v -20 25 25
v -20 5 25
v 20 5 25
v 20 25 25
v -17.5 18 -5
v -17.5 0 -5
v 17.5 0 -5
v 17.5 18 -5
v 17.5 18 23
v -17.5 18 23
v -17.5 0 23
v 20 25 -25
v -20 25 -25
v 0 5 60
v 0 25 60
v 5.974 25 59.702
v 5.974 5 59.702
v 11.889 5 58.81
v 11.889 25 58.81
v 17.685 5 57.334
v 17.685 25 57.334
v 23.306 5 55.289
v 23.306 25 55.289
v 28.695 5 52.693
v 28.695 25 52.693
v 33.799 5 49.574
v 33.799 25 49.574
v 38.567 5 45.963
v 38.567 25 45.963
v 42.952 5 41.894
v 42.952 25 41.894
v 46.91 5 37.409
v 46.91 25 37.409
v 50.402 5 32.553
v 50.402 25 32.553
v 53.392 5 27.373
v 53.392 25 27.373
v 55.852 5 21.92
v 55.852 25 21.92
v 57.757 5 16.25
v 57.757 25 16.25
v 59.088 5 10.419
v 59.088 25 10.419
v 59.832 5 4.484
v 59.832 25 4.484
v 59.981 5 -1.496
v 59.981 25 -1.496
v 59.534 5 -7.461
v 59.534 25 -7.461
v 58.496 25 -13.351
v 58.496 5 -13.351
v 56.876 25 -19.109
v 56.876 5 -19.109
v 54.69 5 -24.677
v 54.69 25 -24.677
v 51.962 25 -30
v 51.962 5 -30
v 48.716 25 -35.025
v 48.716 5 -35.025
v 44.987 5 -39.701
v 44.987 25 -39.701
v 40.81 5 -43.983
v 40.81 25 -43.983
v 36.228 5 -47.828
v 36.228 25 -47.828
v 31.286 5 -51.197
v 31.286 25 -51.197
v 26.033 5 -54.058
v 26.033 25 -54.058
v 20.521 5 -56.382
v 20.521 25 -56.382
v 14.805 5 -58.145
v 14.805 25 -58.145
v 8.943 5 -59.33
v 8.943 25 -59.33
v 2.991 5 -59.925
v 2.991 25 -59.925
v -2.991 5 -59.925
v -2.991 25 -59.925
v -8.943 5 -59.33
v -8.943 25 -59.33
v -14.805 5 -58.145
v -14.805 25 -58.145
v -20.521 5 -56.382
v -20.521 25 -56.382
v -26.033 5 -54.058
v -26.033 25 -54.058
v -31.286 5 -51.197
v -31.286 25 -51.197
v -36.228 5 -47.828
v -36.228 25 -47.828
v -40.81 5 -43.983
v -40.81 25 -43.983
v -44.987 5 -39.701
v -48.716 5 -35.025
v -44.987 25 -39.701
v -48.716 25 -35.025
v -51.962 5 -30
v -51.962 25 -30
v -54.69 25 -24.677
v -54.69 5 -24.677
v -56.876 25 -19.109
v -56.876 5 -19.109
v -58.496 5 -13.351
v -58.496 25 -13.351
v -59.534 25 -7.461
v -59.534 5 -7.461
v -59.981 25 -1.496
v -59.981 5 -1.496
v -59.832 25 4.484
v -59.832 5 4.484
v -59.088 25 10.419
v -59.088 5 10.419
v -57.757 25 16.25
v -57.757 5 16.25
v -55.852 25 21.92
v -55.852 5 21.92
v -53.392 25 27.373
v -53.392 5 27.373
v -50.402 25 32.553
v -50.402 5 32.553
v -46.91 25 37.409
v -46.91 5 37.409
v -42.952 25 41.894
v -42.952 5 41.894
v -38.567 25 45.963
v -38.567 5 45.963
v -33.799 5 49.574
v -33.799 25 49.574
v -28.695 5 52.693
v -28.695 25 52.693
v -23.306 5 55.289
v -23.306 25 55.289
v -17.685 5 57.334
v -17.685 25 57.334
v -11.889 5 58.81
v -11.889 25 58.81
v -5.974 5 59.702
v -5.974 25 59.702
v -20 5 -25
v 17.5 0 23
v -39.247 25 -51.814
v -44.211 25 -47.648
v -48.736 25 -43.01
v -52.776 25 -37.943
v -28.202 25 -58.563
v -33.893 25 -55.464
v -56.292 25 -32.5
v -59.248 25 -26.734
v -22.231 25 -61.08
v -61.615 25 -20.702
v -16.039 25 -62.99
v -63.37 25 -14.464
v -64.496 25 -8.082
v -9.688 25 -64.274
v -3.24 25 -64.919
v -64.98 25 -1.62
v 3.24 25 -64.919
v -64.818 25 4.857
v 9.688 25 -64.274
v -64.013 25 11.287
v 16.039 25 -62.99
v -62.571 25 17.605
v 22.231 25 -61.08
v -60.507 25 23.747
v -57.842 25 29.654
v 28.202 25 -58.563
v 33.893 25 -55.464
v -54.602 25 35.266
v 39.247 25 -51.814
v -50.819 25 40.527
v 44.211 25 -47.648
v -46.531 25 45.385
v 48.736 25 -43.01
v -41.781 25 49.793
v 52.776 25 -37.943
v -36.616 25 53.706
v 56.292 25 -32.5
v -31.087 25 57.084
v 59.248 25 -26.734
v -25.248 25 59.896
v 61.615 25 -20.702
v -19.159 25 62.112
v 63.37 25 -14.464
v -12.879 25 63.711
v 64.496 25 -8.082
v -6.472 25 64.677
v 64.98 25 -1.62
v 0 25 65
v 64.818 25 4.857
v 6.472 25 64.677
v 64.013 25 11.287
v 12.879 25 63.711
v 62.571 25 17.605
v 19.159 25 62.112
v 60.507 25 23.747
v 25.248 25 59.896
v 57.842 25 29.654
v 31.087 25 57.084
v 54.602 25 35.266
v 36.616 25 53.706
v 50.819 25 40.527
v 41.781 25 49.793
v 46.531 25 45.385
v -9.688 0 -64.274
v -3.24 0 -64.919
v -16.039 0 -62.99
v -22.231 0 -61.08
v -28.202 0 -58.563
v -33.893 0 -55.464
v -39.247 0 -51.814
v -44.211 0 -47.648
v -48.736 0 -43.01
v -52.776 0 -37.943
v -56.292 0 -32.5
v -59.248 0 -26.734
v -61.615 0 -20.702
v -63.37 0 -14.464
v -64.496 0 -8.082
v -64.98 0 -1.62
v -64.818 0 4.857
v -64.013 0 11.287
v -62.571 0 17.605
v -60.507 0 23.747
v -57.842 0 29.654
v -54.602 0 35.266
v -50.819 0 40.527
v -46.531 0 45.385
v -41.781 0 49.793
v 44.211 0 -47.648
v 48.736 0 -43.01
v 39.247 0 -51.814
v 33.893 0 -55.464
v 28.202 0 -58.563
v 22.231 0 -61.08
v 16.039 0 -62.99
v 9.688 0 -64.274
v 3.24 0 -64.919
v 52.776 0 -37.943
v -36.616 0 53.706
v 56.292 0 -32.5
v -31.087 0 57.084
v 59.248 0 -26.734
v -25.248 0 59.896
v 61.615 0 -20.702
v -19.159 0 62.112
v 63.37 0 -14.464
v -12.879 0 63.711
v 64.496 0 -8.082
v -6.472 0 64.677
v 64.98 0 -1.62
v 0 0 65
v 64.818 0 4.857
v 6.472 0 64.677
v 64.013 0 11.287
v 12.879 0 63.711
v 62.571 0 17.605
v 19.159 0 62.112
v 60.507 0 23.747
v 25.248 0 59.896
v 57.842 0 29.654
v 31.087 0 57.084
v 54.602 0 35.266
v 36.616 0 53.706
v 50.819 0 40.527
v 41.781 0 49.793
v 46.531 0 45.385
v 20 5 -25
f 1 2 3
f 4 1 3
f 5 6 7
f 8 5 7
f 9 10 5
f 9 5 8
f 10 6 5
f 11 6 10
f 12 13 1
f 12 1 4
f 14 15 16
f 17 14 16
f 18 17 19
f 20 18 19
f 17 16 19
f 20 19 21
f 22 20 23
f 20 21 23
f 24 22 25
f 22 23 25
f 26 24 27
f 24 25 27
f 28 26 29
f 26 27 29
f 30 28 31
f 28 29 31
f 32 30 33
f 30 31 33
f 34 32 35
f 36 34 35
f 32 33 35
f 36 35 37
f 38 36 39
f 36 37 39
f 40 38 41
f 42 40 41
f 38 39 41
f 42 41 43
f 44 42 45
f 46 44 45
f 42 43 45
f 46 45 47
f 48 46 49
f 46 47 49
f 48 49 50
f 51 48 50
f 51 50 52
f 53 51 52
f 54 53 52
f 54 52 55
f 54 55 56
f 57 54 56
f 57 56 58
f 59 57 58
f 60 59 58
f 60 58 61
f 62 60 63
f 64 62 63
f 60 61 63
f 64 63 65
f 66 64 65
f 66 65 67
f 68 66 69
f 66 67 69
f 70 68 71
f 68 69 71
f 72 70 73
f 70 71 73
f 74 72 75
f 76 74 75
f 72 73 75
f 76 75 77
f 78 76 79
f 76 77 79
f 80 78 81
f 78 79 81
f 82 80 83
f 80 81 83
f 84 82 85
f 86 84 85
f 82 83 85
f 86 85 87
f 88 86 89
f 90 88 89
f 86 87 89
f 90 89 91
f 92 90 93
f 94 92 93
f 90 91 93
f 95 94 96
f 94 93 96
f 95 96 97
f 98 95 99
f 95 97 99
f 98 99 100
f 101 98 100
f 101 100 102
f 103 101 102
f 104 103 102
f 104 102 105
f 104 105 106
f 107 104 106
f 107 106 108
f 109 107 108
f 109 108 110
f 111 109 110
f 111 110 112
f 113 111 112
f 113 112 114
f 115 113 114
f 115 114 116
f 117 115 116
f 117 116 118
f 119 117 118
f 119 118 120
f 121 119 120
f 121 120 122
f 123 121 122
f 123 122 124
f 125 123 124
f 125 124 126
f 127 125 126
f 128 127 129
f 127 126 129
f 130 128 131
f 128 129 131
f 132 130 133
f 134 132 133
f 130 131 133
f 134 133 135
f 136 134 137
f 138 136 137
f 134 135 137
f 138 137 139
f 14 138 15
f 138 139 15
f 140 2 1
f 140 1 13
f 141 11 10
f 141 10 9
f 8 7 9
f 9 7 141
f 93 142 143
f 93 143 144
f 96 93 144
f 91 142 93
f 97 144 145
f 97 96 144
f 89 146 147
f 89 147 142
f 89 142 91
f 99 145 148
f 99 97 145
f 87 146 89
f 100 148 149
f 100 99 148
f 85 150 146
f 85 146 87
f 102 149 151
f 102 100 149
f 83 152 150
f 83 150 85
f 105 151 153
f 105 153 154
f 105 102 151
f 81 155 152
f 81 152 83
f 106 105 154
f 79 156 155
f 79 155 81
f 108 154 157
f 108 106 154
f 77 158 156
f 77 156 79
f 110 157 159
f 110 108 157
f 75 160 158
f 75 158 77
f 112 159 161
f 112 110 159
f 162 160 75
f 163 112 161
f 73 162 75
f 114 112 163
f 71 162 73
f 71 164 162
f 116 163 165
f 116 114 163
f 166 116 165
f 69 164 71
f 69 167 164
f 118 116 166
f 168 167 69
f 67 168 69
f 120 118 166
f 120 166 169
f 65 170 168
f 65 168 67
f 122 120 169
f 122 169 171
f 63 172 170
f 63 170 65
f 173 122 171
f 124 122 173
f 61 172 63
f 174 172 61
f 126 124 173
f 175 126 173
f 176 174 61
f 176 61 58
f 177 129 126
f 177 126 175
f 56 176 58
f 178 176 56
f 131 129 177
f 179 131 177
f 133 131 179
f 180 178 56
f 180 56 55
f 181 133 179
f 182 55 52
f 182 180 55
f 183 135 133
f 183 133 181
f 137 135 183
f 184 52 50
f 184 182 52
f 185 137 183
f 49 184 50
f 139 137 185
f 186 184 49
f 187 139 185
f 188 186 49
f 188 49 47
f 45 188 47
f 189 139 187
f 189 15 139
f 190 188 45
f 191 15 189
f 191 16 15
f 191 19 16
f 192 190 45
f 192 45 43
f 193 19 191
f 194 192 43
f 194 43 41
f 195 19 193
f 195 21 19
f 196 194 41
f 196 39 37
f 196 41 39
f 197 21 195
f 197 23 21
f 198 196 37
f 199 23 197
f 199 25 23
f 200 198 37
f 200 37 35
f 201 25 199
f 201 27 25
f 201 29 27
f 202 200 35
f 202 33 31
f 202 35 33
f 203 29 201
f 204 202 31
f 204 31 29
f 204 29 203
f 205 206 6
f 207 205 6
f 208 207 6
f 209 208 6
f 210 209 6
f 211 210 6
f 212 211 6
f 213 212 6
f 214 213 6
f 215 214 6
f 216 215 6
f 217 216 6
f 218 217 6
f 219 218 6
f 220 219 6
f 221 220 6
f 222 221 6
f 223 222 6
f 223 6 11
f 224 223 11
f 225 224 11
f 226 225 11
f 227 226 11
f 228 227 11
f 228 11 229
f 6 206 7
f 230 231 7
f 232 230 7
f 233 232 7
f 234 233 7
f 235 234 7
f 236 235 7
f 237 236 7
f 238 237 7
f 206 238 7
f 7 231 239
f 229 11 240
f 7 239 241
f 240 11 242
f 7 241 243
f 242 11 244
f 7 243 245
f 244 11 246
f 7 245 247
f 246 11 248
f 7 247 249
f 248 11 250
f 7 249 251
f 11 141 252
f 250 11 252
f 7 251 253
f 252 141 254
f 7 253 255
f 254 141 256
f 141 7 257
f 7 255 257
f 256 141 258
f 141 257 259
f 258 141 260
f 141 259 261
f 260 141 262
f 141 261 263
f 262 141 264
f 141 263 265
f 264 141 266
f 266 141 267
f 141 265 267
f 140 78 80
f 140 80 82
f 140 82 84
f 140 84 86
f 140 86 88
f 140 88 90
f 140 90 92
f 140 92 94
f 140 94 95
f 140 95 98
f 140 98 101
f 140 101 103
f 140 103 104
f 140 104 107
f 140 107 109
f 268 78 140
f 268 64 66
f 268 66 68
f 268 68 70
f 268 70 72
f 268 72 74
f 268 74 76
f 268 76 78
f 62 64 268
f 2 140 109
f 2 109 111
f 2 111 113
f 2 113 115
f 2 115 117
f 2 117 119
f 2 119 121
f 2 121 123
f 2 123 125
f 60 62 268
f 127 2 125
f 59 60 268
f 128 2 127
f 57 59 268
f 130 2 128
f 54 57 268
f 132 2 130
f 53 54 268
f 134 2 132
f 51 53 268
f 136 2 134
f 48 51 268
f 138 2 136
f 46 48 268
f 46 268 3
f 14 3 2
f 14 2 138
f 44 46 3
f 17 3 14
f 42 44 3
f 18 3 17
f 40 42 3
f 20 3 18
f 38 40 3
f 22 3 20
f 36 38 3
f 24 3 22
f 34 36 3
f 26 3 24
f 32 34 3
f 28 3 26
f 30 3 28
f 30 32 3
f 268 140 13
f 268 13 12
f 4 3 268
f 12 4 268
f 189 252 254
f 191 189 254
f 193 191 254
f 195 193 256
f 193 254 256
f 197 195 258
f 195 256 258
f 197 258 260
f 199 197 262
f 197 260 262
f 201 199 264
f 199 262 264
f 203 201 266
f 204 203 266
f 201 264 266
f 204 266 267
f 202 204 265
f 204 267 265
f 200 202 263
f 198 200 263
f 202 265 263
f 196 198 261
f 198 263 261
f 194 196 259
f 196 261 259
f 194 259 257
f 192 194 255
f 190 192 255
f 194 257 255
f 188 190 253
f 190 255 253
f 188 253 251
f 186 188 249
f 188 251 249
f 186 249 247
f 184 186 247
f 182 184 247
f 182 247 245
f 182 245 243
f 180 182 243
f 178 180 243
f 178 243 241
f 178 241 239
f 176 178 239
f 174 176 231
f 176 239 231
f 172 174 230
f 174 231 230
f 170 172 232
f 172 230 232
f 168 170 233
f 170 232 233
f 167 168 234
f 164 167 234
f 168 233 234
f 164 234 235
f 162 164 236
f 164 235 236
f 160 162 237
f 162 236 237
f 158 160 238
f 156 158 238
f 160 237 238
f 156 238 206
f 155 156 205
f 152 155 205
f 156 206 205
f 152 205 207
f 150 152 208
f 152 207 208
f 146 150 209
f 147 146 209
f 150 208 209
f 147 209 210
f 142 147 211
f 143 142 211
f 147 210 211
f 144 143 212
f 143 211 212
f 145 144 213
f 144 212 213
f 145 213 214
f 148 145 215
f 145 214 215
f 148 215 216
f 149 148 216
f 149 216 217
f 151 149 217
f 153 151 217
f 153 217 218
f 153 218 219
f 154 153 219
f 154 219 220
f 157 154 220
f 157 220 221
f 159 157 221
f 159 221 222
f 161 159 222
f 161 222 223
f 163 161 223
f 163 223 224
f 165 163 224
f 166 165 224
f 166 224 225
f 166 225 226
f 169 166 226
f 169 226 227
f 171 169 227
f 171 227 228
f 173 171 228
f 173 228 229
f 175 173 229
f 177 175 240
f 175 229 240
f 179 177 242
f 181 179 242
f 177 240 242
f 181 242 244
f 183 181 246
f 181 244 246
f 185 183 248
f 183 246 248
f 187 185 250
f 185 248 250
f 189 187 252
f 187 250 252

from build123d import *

# Parameters (mm, degrees)
SKETCH1_R           = 65
BOSS_EXTRUDE2_DEPTH = 25
SKETCH2_R           = 60
CUT_EXTRUDE1_DEPTH  = 20
SKETCH3_W           = 40
SKETCH3_H           = 50
BOSS_EXTRUDE3_DEPTH = 20
SKETCH4_W           = 35
SKETCH4_H           = 28
CUT_EXTRUDE2_DEPTH  = 18


with BuildPart() as part:
    # Sketch1 → Boss-Extrude2 (new body)
    with BuildSketch(Plane(origin=(0, 0, 0), x_dir=(1, 0, 0), z_dir=(0, 1, 0))):
        with Locations(Location((0, 0, 0), (0, 0, 270))):
            Circle(SKETCH1_R)
    extrude(amount=BOSS_EXTRUDE2_DEPTH)

    # Sketch2 → Cut-Extrude1 (cut)
    with BuildSketch(Plane(origin=(0, 25, 0), x_dir=(1, 0, 0), z_dir=(0, 1, 0))):
        with Locations(Location((0, 0, 0), (0, 0, 270))):
            Circle(SKETCH2_R)
    extrude(amount=-CUT_EXTRUDE1_DEPTH, mode=Mode.SUBTRACT)

    # Sketch3 → Boss-Extrude3 (add)
    with BuildSketch(Plane(origin=(0, 5, 0), x_dir=(1, 0, 0), z_dir=(0, 1, 0))):
        Rectangle(SKETCH3_W, SKETCH3_H)
    extrude(amount=BOSS_EXTRUDE3_DEPTH)

    # Sketch4 → Cut-Extrude2 (cut)
    with BuildSketch(Plane.XZ):
        with Locations((0, 9)):
            Rectangle(SKETCH4_W, SKETCH4_H)
    extrude(amount=-CUT_EXTRUDE2_DEPTH, mode=Mode.SUBTRACT)


solid = part.part
